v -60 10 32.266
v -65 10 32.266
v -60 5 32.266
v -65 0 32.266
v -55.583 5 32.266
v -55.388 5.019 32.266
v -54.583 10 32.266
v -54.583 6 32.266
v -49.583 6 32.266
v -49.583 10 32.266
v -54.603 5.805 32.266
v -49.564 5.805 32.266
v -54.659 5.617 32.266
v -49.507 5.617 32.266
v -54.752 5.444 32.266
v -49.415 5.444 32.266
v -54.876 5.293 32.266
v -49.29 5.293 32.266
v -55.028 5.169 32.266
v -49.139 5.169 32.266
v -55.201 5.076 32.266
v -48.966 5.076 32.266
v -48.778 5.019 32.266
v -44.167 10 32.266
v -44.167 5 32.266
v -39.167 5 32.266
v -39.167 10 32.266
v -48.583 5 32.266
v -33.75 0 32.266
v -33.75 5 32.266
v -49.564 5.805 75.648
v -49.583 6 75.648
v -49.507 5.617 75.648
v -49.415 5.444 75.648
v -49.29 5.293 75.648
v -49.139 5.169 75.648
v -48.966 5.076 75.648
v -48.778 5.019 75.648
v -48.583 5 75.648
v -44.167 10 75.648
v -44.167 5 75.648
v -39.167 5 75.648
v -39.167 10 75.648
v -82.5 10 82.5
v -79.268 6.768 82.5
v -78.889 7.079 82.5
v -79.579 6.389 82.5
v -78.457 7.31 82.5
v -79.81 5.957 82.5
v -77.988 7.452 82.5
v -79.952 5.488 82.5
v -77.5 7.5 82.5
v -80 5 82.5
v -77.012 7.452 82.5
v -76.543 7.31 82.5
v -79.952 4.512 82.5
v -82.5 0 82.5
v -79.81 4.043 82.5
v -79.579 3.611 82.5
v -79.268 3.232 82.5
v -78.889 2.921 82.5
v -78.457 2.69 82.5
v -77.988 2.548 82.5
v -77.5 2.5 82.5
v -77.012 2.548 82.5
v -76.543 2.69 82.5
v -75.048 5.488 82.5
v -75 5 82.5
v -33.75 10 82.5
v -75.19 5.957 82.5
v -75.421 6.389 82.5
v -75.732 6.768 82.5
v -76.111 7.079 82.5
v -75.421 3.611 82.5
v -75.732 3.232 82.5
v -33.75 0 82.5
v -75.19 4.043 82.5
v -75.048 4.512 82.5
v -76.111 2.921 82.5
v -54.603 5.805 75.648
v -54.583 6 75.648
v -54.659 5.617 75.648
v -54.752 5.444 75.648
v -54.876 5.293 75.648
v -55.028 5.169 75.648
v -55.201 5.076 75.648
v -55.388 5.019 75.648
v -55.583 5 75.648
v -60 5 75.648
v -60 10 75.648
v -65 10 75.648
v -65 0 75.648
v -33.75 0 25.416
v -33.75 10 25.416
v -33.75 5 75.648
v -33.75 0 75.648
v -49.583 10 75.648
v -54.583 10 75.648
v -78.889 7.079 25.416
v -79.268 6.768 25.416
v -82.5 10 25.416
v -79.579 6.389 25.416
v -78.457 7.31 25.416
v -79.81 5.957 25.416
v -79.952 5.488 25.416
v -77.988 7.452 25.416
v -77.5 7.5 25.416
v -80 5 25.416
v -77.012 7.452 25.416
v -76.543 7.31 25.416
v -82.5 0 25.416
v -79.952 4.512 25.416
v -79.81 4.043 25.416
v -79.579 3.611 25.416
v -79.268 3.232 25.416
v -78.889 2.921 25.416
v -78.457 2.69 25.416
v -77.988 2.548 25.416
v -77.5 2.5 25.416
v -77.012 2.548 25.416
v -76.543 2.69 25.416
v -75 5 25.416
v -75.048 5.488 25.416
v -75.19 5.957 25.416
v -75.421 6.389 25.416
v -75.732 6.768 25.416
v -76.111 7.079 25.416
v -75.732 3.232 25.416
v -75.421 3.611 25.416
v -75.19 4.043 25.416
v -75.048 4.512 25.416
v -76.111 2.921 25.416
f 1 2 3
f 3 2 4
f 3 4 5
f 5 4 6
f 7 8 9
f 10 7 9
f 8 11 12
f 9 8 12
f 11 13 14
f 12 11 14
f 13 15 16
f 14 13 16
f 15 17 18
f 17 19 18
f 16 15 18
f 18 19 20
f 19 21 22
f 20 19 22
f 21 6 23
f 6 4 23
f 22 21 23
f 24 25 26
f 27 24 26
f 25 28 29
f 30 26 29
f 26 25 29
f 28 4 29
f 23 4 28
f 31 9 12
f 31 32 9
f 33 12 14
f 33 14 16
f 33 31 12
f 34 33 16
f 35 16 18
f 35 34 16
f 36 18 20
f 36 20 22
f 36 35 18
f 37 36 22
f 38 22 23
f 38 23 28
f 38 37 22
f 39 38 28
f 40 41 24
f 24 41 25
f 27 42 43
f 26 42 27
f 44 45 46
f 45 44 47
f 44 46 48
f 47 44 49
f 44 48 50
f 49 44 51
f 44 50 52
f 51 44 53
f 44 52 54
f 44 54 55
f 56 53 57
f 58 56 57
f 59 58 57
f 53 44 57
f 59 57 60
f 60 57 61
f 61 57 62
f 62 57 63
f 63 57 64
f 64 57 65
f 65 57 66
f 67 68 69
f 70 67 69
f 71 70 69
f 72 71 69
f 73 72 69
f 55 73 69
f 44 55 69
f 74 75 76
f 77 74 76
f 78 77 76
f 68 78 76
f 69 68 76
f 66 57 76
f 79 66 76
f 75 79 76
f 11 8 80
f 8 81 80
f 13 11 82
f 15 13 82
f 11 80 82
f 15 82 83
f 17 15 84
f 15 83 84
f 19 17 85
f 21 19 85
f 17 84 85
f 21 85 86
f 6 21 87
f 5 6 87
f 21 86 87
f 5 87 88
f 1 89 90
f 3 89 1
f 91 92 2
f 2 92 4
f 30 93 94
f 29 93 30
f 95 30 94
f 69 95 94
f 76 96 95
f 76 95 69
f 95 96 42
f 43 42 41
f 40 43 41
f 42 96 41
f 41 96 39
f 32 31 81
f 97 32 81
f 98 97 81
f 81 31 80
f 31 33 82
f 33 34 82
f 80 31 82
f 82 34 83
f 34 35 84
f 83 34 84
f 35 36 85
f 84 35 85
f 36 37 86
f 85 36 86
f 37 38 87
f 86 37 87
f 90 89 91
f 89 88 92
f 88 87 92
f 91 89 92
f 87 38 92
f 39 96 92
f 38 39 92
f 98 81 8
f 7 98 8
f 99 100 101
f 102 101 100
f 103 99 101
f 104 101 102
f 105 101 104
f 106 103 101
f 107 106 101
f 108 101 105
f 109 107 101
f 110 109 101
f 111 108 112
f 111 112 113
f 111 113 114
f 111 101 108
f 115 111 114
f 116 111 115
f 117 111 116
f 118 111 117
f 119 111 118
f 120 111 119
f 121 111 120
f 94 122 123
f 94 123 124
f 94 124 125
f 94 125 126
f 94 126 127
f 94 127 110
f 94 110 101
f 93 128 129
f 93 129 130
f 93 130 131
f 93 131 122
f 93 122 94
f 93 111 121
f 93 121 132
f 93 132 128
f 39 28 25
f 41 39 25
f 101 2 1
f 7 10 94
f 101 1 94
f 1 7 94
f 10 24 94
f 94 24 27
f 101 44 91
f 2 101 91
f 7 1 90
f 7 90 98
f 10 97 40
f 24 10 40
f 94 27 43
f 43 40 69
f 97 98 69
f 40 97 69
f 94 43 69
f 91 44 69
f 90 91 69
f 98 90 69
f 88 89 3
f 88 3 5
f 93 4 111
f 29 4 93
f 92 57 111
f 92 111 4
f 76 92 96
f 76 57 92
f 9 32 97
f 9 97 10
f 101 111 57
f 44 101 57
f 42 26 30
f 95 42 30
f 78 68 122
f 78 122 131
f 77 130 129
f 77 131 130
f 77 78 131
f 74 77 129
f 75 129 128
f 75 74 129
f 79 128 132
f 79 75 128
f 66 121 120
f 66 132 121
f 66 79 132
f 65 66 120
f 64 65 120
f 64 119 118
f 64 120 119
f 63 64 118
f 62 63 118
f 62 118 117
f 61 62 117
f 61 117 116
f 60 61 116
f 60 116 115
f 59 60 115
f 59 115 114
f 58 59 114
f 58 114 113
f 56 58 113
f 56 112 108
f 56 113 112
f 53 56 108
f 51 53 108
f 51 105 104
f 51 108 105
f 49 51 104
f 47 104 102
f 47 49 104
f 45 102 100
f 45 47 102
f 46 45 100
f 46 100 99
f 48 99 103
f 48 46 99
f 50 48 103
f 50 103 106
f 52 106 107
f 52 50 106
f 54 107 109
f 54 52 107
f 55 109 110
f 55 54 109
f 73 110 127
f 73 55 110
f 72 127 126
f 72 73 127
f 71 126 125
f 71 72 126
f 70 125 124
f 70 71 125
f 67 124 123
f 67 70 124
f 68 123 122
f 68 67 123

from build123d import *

# Parameters (mm, degrees)
ESQUISSE1_W             = 5
ESQUISSE1_H             = 150
ESQUISSE1_R             = 15
BASE_DEPTH              = 10
VIDE_VIS_DEPTH          = 127.219055614
VIDE_VIS_DEPTH_BACK     = 127.219055614
ESQUISSE5_R             = 2.5
ESQUISSE6_W             = 130
ESQUISSE6_H             = 150
ENL_V_MAT_EXTRU_6_DEPTH = 5
VIDE_TEST_DEPTH         = 118.100384286
ESQUISSE8_W             = 31.25
ESQUISSE8_H             = 6.85
BOSS_FERME_DEPTH        = 10
CONGE_TEST_R            = 1


with BuildPart() as part:
    # Esquisse1 → BASE (new body)
    with BuildSketch(Plane(origin=(0, 0, 0), x_dir=(1, 0, 0), z_dir=(0, 1, 0))):
        Polygon((-82.5, 82.5), (-82.5, 77.5), (-72.5, 77.5), (-72.5, 67.5), (-82.5, 67.5), (-82.5, -2.5), (-72.5, -2.5), (-72.5, -12.5), (-82.5, -12.5), (-82.5, -82.5), (82.5, -82.5), (82.5, -12.5), (72.5, -12.5), (72.5, -2.5), (82.5, -2.5), (82.5, 67.5), (72.5, 67.5), (72.5, 77.5), (82.5, 77.5), (82.5, 82.5), align=None)
        with BuildLine():
            ThreePointArc((-12.916666667, -10.915030923), (-10.627210874, -13.27000839), (-7.916666667, -15.124860621))
            Line((-7.916666667, -15.124860621), (-7.916666667, -75.648107225))
            Line((-7.916666667, -75.648107225), (-12.916666667, -75.648107225))
            Line((-12.916666667, -75.648107225), (-12.916666667, -10.915030923))
        make_face(mode=Mode.SUBTRACT)
        with Locations((-62.5, -0.648107225)):
            Rectangle(ESQUISSE1_W, ESQUISSE1_H, mode=Mode.SUBTRACT)
        with Locations((-52.083333333, -0.648107225)):
            Rectangle(ESQUISSE1_W, ESQUISSE1_H, mode=Mode.SUBTRACT)
        with Locations((-41.666666667, -0.648107225)):
            Rectangle(ESQUISSE1_W, ESQUISSE1_H, mode=Mode.SUBTRACT)
        with Locations((-31.25, -0.648107225)):
            Rectangle(ESQUISSE1_W, ESQUISSE1_H, mode=Mode.SUBTRACT)
        with Locations((-20.833333333, -0.648107225)):
            Rectangle(ESQUISSE1_W, ESQUISSE1_H, mode=Mode.SUBTRACT)
        with Locations(Location((0, -0.648107225, 0), (0, 0, 270))):
            Circle(ESQUISSE1_R, mode=Mode.SUBTRACT)
        with BuildLine():
            Line((-2.5, -75.648107225), (-2.5, -16.957613655))
            ThreePointArc((-2.5, -16.957613655), (0, -17.148107225), (2.5, -16.957613655))
            Line((2.5, -16.957613655), (2.5, -75.648107225))
            Line((2.5, -75.648107225), (-2.5, -75.648107225))
        make_face(mode=Mode.SUBTRACT)
        with BuildLine():
            Line((7.916666667, -75.648107225), (7.916666667, -15.124860621))
            ThreePointArc((7.916666667, -15.124860621), (10.627210874, -13.27000839), (12.916666667, -10.915030923))
            Line((12.916666667, -10.915030923), (12.916666667, -75.648107225))
            Line((12.916666667, -75.648107225), (7.916666667, -75.648107225))
        make_face(mode=Mode.SUBTRACT)
        with BuildLine():
            Line((-12.916666667, 9.618816473), (-12.916666667, 74.351892775))
            Line((-12.916666667, 74.351892775), (-7.916666667, 74.351892775))
            Line((-7.916666667, 74.351892775), (-7.916666667, 13.828646171))
            ThreePointArc((-7.916666667, 13.828646171), (-10.627210874, 11.973793941), (-12.916666667, 9.618816473))
        make_face(mode=Mode.SUBTRACT)
        with Locations((20.833333333, -0.648107225)):
            Rectangle(ESQUISSE1_W, ESQUISSE1_H, mode=Mode.SUBTRACT)
        with Locations((31.25, -0.648107225)):
            Rectangle(ESQUISSE1_W, ESQUISSE1_H, mode=Mode.SUBTRACT)
        with Locations((41.666666667, -0.648107225)):
            Rectangle(ESQUISSE1_W, ESQUISSE1_H, mode=Mode.SUBTRACT)
        with Locations((52.083333333, -0.648107225)):
            Rectangle(ESQUISSE1_W, ESQUISSE1_H, mode=Mode.SUBTRACT)
        with Locations((62.5, -0.648107225)):
            Rectangle(ESQUISSE1_W, ESQUISSE1_H, mode=Mode.SUBTRACT)
        with BuildLine():
            Line((-2.5, 15.661399205), (-2.5, 74.351892775))
            Line((-2.5, 74.351892775), (2.5, 74.351892775))
            Line((2.5, 74.351892775), (2.5, 15.661399205))
            ThreePointArc((2.5, 15.661399205), (0, 15.851892775), (-2.5, 15.661399205))
        make_face(mode=Mode.SUBTRACT)
        with BuildLine():
            Line((12.916666667, 74.351892775), (12.916666667, 9.618816473))
            ThreePointArc((12.916666667, 9.618816473), (10.627210874, 11.973793941), (7.916666667, 13.828646171))
            Line((7.916666667, 13.828646171), (7.916666667, 74.351892775))
            Line((7.916666667, 74.351892775), (12.916666667, 74.351892775))
        make_face(mode=Mode.SUBTRACT)
    extrude(amount=BASE_DEPTH)

    # Esquisse5 → VIDE VIS (cut, two sides: drawn at the far end of the back side and taken through both)
    with BuildSketch(Plane(origin=(0, 0, 12.5), x_dir=(-1, 0, 0), z_dir=(0, 0, -1)).offset(-VIDE_VIS_DEPTH_BACK)):
        with Locations((-77.5, 5)):
            Circle(ESQUISSE5_R)
        with Locations(Location((77.5, 5, 0), (0, 0, 180))):
            Circle(ESQUISSE5_R)
    extrude(amount=VIDE_VIS_DEPTH + VIDE_VIS_DEPTH_BACK, mode=Mode.SUBTRACT)

    # Esquisse6 → Enlèv. mat.-Extru.6 (cut)
    with BuildSketch(Plane.XZ):
        with Locations((0, 0.648107225)):
            Rectangle(ESQUISSE6_W, ESQUISSE6_H)
    extrude(amount=-ENL_V_MAT_EXTRU_6_DEPTH, mode=Mode.SUBTRACT)

    # Esquisse7 → VIDE TEST (cut, through all)
    with BuildSketch(Plane(origin=(0, 10, 0), x_dir=(1, 0, 0), z_dir=(0, 1, 0))):
        Polygon((-33.75, -25.416267648), (-33.75, -82.5), (82.5, -82.5), (82.5, 82.5), (-82.5, 82.5), (-82.5, -25.416267648), align=None)
    extrude(amount=-VIDE_TEST_DEPTH, mode=Mode.SUBTRACT)

    # Esquisse8 → BOSS FERME (add)
    with BuildSketch(Plane.XZ):
        with Locations((-49.375, 28.841267648)):
            Rectangle(ESQUISSE8_W, ESQUISSE8_H)
    extrude(amount=-BOSS_FERME_DEPTH)

    # CONGE TEST
    conge_test_edges = [part.edges().sort_by_distance(p)[0] for p in [
        (-54.583333333, 5, 53.957187436),
        (-49.583333333, 5, 53.957187436),
    ]]
    fillet(conge_test_edges, radius=CONGE_TEST_R)


solid = part.part
